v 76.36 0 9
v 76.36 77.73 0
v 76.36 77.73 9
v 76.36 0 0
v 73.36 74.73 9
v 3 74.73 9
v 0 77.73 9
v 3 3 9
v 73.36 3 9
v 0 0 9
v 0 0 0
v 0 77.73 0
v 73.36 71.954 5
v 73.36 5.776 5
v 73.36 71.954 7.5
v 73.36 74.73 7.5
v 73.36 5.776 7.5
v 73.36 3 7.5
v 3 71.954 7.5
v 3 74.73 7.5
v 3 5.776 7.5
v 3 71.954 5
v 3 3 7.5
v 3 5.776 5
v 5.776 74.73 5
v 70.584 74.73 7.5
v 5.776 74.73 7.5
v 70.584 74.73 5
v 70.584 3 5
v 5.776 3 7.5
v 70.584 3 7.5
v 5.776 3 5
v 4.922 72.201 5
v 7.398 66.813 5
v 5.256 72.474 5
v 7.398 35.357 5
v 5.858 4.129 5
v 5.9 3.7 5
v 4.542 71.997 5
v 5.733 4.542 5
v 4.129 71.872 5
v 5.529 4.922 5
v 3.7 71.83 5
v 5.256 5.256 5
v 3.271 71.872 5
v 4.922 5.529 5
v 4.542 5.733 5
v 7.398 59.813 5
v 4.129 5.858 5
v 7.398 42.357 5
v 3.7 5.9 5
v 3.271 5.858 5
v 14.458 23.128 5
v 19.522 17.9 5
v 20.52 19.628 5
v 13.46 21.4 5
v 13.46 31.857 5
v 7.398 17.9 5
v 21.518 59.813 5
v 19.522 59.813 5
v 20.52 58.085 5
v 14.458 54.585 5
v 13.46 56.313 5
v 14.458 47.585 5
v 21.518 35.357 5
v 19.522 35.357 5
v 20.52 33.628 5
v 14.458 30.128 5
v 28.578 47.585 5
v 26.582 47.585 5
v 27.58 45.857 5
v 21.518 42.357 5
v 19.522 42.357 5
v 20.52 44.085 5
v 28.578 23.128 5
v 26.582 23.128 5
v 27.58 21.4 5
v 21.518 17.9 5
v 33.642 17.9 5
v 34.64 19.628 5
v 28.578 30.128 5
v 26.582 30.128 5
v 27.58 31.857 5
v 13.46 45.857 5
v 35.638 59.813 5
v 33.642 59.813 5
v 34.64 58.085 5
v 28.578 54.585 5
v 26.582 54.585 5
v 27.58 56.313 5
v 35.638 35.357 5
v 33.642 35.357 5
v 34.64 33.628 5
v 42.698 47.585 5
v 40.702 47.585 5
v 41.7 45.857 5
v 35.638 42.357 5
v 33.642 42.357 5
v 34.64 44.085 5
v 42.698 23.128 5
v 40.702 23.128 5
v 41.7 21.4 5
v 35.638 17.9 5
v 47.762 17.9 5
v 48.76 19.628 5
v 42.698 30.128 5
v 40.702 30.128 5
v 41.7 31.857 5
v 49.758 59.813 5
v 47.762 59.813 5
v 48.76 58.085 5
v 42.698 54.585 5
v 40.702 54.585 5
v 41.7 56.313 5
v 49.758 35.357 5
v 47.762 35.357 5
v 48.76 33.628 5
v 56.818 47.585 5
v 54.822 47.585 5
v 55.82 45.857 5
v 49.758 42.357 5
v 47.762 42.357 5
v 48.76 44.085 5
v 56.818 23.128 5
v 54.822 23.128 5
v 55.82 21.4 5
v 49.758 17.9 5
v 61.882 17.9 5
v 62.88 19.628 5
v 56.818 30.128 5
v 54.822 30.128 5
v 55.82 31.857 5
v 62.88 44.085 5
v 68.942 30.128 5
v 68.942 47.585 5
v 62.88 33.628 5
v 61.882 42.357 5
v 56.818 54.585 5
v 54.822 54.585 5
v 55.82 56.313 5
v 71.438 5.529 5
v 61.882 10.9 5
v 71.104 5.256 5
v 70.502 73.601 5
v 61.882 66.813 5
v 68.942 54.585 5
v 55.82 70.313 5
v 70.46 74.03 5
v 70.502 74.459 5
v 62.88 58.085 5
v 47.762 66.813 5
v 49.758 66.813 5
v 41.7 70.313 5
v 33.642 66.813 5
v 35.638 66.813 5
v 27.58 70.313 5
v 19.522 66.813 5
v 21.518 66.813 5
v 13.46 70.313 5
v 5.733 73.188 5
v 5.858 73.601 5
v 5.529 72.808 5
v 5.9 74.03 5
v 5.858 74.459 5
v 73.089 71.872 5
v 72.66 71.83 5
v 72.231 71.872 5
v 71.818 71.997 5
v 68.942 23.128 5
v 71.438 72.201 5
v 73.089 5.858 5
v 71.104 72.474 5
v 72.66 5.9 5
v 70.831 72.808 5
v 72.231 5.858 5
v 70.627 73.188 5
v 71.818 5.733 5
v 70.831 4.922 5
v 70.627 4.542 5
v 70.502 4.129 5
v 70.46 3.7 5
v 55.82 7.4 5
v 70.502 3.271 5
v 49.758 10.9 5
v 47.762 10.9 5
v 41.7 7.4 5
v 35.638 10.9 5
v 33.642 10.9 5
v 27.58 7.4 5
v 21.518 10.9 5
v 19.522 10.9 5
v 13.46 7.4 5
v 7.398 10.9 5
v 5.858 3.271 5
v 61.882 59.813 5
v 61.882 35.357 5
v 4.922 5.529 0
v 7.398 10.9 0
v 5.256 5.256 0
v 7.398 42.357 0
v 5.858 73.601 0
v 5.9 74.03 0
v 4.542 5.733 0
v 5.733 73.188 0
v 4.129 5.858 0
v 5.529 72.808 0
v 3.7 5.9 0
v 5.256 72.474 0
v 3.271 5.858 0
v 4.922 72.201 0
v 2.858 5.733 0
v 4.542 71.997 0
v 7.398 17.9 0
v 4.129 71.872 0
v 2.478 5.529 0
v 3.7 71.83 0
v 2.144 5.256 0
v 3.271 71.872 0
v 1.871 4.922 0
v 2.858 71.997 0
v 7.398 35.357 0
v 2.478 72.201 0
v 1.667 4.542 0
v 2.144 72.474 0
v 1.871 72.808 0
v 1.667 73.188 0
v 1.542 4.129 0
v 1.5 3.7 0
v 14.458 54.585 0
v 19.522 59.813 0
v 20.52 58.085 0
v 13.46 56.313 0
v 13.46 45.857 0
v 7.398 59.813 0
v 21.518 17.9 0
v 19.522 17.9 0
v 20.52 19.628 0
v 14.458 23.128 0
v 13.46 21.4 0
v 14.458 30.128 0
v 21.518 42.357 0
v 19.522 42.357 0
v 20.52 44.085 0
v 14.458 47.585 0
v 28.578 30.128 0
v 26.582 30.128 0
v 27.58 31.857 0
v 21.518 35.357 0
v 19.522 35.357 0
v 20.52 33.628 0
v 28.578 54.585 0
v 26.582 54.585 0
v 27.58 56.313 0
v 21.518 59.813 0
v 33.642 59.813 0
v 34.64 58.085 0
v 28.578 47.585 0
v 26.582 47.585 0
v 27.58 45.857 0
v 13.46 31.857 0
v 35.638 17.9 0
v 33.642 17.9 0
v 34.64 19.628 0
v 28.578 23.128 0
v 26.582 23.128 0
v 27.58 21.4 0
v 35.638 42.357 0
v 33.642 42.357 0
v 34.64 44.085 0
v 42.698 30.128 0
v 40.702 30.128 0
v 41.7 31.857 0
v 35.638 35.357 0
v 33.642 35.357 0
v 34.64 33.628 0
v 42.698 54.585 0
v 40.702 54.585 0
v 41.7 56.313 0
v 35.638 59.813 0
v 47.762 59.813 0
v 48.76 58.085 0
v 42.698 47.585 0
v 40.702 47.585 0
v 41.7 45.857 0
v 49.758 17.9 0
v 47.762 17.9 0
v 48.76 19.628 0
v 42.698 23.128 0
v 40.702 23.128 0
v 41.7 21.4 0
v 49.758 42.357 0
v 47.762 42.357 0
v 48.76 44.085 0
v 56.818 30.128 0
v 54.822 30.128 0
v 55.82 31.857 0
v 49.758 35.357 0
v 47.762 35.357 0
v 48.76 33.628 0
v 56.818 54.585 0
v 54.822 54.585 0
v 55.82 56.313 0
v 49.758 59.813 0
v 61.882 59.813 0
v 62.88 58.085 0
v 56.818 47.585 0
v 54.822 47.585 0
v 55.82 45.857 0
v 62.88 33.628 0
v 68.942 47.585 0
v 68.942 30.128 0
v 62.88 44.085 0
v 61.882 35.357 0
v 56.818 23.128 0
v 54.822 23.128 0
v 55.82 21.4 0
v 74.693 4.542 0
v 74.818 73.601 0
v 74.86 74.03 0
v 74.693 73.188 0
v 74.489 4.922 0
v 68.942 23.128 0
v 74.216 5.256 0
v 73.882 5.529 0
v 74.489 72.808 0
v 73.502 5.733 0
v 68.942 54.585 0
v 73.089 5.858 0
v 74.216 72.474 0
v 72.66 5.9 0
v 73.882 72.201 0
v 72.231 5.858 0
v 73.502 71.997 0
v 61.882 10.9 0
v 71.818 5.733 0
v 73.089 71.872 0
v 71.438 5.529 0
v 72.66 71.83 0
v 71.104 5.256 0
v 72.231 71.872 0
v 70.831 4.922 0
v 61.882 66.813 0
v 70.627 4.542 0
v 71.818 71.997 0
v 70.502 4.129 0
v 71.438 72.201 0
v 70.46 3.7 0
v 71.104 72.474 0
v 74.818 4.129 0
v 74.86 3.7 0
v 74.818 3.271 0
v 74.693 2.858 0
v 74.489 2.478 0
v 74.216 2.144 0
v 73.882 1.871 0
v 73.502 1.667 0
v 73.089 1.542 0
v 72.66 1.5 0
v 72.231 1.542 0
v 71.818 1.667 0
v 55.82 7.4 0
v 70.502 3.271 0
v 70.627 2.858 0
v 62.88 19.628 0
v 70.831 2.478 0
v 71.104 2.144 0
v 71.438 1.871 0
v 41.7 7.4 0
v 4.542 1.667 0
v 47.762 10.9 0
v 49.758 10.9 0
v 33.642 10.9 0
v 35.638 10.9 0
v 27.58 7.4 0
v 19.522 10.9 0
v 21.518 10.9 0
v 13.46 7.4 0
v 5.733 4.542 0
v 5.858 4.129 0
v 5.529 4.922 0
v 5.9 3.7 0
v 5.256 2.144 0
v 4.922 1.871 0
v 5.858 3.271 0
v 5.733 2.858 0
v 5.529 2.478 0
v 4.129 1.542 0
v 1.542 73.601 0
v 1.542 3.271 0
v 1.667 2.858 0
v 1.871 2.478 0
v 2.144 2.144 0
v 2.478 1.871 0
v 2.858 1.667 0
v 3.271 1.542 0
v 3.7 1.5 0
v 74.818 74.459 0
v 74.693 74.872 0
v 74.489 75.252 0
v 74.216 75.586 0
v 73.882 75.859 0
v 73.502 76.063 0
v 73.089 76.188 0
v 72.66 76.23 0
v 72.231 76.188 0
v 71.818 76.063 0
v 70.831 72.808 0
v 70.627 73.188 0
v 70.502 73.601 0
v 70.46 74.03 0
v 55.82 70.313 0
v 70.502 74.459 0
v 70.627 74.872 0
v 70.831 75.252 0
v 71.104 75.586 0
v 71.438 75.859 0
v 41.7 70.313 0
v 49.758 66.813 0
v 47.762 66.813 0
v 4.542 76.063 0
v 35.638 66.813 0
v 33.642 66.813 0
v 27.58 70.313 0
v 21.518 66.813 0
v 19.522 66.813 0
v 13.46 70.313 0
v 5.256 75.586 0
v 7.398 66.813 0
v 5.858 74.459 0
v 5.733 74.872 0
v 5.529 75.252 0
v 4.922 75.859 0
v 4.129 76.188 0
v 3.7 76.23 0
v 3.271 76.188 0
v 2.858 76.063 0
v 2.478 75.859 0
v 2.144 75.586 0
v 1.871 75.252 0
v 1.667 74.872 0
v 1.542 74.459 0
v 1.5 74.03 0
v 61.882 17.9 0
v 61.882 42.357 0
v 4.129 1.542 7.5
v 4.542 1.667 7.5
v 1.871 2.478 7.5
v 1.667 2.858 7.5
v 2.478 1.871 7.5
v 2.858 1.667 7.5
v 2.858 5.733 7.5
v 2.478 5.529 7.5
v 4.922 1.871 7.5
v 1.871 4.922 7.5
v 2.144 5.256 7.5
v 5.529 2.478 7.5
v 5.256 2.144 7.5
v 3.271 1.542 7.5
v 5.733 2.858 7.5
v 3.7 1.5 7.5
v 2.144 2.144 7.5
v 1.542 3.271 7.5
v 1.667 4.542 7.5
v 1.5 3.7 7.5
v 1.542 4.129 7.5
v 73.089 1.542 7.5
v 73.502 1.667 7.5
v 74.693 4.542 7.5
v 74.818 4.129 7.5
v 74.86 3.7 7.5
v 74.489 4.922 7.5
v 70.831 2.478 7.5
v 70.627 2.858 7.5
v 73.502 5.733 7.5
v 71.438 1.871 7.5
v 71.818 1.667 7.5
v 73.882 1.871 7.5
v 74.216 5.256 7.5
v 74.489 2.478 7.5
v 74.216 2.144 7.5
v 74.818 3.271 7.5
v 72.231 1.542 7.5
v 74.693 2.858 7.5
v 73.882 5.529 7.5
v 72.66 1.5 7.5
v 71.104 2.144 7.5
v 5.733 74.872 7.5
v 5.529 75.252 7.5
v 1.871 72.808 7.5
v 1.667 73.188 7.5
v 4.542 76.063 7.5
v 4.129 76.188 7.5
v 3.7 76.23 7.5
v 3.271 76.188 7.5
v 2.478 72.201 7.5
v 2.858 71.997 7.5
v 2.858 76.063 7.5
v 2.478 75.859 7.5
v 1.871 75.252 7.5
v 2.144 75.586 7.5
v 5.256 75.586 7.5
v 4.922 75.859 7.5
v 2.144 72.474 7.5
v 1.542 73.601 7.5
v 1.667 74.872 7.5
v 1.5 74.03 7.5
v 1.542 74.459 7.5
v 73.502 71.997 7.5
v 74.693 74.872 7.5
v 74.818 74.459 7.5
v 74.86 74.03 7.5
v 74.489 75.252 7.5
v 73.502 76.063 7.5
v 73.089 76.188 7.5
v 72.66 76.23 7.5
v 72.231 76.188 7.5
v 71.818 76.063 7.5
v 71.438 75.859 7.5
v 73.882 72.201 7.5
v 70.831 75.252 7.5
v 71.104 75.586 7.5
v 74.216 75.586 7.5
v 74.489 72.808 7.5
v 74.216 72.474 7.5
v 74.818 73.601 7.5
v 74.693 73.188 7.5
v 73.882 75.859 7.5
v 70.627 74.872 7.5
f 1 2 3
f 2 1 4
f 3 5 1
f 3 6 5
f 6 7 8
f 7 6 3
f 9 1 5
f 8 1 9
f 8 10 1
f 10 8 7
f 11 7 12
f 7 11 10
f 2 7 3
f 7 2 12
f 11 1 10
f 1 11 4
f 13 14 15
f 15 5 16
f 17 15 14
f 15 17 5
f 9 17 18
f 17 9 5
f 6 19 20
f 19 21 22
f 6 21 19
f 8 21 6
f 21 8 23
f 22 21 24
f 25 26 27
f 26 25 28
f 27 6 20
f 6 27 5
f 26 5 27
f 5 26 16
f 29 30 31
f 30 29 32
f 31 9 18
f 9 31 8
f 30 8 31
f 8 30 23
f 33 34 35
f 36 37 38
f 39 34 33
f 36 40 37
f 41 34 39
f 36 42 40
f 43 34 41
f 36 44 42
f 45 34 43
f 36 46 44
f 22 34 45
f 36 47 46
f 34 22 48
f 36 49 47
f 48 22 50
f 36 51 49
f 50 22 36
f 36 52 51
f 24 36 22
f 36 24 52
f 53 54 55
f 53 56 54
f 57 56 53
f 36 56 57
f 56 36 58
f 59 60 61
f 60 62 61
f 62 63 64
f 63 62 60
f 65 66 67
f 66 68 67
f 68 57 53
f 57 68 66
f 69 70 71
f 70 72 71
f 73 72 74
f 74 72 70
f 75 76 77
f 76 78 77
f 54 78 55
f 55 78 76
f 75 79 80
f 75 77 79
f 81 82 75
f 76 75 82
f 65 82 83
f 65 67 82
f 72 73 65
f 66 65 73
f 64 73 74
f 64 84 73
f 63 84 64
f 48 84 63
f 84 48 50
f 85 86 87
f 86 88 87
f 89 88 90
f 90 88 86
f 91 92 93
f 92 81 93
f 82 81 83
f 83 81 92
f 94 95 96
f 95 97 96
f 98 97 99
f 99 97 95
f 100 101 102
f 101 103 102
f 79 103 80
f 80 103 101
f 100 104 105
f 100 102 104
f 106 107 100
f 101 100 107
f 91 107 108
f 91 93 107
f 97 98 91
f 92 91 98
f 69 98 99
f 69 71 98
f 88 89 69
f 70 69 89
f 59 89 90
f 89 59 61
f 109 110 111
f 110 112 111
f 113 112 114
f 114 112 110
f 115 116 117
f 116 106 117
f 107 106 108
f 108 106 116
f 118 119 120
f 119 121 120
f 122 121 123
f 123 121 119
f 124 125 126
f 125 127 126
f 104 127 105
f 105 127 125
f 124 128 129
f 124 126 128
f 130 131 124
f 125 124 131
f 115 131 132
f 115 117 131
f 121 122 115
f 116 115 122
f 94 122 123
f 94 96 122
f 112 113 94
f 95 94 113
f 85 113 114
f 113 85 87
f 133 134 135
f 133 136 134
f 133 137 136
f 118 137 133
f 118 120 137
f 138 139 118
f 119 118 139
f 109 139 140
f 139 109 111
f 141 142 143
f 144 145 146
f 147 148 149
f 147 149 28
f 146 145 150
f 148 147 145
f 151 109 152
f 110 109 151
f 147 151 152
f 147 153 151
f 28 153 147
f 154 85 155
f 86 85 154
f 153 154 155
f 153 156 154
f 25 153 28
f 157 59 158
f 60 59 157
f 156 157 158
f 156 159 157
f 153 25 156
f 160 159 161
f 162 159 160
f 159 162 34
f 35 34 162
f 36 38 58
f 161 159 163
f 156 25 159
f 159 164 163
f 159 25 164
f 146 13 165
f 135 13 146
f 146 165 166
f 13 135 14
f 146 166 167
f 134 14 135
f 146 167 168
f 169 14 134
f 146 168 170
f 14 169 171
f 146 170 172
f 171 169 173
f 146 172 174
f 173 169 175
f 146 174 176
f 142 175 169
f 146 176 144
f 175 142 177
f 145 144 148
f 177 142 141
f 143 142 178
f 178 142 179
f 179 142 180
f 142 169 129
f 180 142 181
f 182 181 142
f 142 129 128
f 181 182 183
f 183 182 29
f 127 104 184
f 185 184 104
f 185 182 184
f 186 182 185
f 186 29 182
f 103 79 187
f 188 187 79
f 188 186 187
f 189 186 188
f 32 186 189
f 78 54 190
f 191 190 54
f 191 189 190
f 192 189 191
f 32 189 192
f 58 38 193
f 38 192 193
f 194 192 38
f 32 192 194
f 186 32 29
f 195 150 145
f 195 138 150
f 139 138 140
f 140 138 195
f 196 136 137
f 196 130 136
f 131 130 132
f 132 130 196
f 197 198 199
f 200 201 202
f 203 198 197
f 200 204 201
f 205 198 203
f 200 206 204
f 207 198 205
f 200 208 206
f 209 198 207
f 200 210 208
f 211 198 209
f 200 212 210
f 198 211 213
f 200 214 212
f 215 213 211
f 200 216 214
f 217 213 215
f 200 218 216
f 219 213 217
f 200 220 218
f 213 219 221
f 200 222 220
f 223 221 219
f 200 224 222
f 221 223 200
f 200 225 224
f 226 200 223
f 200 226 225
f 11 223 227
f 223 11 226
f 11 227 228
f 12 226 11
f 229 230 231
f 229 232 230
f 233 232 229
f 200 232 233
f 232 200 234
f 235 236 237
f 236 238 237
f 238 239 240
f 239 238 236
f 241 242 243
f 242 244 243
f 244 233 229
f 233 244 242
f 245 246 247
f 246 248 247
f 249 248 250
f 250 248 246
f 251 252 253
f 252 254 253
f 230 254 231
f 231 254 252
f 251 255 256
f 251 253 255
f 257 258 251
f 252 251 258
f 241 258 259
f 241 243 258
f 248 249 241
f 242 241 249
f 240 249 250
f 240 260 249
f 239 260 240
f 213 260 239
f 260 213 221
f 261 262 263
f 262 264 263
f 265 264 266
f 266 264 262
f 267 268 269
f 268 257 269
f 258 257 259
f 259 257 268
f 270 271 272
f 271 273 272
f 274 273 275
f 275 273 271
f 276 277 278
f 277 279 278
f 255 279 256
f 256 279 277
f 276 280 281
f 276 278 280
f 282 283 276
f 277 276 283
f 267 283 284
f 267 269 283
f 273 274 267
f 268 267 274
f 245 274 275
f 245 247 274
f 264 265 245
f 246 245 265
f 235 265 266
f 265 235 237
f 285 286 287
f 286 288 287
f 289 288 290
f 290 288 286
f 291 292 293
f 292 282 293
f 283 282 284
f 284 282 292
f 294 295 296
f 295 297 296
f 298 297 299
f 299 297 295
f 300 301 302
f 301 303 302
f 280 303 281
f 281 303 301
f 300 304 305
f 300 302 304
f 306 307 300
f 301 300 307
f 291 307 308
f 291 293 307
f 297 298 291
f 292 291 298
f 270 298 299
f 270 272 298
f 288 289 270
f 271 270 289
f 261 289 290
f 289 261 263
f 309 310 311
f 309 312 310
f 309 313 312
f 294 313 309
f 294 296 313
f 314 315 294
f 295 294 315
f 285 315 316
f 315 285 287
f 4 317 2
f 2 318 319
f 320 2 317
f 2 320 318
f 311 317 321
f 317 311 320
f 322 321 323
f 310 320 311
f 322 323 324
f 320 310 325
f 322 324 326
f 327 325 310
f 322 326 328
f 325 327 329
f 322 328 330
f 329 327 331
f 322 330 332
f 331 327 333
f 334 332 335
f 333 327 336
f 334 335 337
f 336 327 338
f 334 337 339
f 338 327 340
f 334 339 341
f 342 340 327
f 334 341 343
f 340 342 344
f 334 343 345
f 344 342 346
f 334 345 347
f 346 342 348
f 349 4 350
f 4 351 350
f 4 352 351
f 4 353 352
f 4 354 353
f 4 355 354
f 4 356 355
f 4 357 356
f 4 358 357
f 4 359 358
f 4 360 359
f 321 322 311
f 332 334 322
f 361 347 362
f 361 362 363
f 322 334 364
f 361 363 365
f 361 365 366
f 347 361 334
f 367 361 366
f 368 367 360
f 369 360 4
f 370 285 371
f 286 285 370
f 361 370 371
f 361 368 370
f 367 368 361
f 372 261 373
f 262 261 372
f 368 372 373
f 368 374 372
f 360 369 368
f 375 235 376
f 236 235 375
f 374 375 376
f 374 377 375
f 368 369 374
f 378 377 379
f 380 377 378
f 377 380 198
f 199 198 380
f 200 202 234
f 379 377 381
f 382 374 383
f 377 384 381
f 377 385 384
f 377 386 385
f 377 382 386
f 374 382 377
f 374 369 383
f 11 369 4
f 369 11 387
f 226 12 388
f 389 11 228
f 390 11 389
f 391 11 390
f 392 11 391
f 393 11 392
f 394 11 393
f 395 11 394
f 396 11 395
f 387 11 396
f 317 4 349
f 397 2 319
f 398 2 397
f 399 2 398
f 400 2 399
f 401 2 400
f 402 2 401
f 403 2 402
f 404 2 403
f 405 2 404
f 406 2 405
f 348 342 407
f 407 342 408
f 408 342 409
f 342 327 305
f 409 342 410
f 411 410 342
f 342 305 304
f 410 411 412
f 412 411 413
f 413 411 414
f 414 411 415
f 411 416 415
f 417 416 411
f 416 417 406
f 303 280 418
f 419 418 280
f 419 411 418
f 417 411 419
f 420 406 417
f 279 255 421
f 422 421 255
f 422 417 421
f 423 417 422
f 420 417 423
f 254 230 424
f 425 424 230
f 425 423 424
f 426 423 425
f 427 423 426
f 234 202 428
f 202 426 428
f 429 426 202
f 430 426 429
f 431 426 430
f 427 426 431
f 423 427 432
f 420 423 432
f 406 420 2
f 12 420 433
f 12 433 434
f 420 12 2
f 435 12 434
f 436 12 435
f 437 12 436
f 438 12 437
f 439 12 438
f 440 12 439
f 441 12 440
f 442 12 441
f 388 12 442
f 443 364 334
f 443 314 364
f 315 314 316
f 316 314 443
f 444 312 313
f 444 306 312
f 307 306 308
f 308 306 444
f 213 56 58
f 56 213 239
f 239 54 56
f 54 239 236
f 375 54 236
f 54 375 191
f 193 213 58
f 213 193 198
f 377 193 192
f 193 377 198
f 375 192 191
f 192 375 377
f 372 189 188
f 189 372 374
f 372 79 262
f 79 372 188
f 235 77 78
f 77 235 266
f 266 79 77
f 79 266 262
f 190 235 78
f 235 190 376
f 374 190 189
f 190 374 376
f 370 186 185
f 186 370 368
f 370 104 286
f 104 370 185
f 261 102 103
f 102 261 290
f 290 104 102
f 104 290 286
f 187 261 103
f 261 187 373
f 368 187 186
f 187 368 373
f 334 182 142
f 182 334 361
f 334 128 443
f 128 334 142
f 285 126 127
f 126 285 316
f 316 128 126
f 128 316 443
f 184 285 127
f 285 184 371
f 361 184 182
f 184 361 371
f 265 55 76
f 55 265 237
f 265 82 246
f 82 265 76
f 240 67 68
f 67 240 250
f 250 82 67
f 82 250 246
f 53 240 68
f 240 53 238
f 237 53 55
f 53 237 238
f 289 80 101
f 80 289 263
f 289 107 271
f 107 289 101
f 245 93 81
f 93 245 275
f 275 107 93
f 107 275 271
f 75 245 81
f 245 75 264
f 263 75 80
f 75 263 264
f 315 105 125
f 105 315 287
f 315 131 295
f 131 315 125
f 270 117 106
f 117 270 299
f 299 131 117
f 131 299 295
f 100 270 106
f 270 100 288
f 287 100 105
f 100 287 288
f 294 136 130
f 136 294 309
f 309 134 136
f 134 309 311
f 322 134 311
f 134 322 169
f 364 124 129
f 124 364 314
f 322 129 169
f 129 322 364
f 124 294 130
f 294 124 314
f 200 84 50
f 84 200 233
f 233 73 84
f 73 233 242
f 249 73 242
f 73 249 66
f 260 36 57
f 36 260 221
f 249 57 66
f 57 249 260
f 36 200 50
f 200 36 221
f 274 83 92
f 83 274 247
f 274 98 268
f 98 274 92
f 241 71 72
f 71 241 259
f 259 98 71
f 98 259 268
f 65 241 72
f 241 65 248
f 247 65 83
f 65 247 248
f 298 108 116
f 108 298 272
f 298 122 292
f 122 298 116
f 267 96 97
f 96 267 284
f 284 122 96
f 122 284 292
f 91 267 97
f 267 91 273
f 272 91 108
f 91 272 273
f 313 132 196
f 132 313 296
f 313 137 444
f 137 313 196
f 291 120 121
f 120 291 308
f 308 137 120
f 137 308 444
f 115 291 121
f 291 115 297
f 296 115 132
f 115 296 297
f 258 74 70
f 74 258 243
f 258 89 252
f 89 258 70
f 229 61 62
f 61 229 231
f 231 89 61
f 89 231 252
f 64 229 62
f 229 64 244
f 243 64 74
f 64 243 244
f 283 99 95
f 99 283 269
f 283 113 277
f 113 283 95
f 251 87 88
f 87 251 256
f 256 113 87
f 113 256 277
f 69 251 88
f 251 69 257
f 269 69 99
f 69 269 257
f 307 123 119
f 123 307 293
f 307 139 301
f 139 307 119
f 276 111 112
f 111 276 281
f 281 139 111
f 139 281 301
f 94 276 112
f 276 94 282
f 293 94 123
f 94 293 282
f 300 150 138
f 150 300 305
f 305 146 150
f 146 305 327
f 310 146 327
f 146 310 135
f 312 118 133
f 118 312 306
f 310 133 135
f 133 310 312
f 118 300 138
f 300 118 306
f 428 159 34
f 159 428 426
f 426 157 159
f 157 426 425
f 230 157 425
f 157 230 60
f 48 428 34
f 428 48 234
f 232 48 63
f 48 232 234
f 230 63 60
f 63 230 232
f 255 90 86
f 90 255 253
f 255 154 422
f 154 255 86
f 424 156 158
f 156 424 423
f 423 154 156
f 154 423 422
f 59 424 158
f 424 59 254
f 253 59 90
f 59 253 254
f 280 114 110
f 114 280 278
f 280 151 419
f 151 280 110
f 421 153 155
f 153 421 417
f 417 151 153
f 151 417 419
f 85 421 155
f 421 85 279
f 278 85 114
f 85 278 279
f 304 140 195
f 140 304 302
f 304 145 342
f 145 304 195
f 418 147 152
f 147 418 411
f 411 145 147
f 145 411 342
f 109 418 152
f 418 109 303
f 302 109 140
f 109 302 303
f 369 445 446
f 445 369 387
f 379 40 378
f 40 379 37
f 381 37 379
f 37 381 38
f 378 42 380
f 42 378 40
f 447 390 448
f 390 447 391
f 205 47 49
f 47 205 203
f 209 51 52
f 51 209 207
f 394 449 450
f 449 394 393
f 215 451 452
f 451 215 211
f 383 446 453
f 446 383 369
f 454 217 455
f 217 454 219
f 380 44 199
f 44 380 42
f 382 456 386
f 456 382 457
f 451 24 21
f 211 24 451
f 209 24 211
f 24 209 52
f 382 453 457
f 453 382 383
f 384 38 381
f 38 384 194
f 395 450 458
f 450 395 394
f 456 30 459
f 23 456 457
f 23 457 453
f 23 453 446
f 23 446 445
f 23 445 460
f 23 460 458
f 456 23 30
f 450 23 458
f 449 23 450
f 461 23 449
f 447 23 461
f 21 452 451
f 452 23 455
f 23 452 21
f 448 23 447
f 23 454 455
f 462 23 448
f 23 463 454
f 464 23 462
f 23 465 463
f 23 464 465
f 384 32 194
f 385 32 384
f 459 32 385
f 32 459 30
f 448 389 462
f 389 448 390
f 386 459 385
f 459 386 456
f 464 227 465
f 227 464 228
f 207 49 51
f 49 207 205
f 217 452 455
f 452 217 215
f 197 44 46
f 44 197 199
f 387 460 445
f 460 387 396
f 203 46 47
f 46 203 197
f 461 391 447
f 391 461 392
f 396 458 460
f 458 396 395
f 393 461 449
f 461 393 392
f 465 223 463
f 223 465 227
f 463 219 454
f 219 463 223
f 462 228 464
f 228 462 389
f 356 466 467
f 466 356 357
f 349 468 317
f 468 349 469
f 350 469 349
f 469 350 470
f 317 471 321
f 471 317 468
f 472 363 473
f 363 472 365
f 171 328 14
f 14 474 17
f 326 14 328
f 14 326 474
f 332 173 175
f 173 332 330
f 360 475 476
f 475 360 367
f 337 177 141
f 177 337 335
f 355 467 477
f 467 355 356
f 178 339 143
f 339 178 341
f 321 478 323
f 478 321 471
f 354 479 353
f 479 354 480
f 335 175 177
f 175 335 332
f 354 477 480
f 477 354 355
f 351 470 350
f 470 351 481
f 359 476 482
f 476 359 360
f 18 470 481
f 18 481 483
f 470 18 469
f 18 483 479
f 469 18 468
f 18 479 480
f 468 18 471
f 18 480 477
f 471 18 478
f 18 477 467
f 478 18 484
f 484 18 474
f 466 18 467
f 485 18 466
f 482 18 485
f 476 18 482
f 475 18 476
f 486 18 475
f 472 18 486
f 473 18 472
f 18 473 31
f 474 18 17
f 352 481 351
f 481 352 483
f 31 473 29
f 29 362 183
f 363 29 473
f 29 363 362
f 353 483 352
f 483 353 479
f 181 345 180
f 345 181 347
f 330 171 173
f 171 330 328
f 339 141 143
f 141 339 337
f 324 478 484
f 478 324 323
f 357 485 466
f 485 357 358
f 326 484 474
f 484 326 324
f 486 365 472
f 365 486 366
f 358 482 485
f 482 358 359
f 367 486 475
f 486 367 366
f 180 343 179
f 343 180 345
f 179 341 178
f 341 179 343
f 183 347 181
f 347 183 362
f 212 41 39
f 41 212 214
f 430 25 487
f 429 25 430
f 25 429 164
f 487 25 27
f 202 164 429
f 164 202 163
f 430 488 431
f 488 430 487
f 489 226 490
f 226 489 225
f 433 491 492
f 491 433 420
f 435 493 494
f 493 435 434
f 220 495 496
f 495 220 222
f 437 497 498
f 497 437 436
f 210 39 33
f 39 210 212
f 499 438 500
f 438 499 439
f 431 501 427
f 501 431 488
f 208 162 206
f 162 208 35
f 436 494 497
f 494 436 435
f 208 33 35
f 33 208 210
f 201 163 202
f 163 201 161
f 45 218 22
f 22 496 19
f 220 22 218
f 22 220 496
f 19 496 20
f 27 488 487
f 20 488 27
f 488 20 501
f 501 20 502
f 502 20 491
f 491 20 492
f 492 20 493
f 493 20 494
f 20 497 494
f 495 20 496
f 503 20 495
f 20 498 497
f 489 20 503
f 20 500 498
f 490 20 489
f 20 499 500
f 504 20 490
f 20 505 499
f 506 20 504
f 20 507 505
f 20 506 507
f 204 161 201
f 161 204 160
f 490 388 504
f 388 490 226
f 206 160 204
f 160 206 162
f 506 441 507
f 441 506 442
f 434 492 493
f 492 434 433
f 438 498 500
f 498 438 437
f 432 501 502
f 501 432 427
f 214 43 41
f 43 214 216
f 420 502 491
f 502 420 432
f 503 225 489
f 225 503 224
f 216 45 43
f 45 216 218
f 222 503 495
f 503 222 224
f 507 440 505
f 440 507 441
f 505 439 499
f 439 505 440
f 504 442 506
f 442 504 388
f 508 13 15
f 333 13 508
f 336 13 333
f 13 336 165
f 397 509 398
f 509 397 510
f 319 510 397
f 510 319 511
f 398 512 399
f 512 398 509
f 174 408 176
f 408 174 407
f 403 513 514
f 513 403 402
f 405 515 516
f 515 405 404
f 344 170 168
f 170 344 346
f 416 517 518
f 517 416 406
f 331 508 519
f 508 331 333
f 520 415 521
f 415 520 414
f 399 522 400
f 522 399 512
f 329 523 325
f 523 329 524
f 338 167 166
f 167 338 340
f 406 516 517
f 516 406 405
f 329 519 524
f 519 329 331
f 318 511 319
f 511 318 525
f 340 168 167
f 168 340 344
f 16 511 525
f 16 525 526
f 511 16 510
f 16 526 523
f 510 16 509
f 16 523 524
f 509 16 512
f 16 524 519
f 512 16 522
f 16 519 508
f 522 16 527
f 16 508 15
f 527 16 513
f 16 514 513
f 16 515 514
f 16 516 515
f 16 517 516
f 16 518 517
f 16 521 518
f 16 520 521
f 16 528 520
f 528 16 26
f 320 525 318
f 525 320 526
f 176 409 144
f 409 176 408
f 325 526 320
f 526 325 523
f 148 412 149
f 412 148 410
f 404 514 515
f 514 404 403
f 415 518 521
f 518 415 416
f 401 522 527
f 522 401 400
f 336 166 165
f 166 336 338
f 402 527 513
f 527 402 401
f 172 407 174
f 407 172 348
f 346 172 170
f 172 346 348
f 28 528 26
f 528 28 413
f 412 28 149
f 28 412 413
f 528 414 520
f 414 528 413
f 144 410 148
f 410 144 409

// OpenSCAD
$fn = 32;

// ----------------------------------------------------------------------
// Honeycomb panel: 76.36 x 77.73 mm, 20 cells of 14 mm
// ----------------------------------------------------------------------

// --- parameters (mm) ---
panel_w = 76.36;          // panel width
panel_d = 77.73;          // panel depth
thick = 5;                // panel thickness
cell_r = 7;               // hex cell circumradius
pitch = 14.12;            // hex cell pitch (centre to centre)
web = 2;                  // web between the cells
columns = 4;              // columns of cells
rows = 5;                 // rows of cells
cell_count = 20;          // total cells
shift_x = 13.46;          // first cell offset in x
shift_y = 14.4;           // first cell offset in y
mount_d = 4.4;            // corner mounting holes
hole_off = 3.7;           // mounting hole offset from the corners
rim_h = 9;                // rim height
rim_t = 3;                // rim wall thickness

difference() {
  union() {
    cube([panel_w, panel_d, thick]);
    /* rim around the panel, sunk 1 mm into the plate */
    translate([0, 0, thick - 1]) difference() {
      cube([panel_w, panel_d, rim_h - thick + 1]);
      translate([rim_t, rim_t, -2.5]) cube([panel_w - 2 * rim_t, panel_d - 2 * rim_t, rim_h - thick + 6]);
    }
  }
  /* hexagonal cells, point-up, cut right through the plate */
  for (row = [0 : rows - 1]) {
    for (col = [0 : columns - 1]) {
      translate([shift_x + col * pitch + (row % 2) * pitch / 2, shift_y + row * pitch * 0.866025, -2.5]) rotate([0, 0, 30]) cylinder(h = thick + 5, d = 2 * cell_r, $fn = 6);
    }
  }
  /* corner mounting holes, clear of the outer cell web */
  translate([3.7, 3.7, -2.5]) cylinder(h = thick + 5, d = mount_d);
  translate([72.66, 3.7, -2.5]) cylinder(h = thick + 5, d = mount_d);
  translate([3.7, 74.03, -2.5]) cylinder(h = thick + 5, d = mount_d);
  translate([72.66, 74.03, -2.5]) cylinder(h = thick + 5, d = mount_d);
}
